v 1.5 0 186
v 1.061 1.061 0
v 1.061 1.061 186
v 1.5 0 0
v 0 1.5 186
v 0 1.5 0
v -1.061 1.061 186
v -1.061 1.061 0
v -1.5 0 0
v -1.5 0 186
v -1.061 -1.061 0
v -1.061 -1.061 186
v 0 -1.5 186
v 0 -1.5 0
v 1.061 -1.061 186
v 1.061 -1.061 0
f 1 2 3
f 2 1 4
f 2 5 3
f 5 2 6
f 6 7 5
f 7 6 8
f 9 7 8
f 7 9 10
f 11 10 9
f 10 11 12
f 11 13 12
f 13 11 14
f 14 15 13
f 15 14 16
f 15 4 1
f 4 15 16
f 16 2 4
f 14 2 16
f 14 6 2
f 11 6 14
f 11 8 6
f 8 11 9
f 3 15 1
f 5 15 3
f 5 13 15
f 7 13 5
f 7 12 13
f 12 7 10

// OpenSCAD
// file: ../configuration.scad
$fa = 2;
$fs = 0.5;

motor_end_height=44;
idler_end_height=28;
carriage_height=13.8;
platform_thickness=10;
platform_fix_dia=28;
platform_dia=38;

bearing_diameter=16;
bearing_dia_clearence=0.5;
bearing_free_dia_clearence=0.8;

hotend_diameter=16.4;
hotend_groove_dia=12;

// Frames

// Places mounting holes for the controller
// 33 = RAMPS 1.3 (Power outputs: Extruder, Bed, Fan)
// 34 = RAMPS 1.3 (Power outputs: Extruder0, Extruder1, Bed)
// 35 = RAMPS 1.3 (Power outputs: Extruder, Fan, Fan)
// 70 = Megatronics
// 701 = Megatronics 2.0

motherboard=35;

frame_thickness=8;

// Distance from motor axle to idler axle
// Calculated regarding length of the HTD3M closed belt 
belt_tooth=354;
spacing = round(((belt_tooth*3) - 3.14159 * 24.83) / 2);

rod_length=spacing+55;
rod_diameter=8;
//platform_hinge_offset=25;
//carriage_hinge_offset=17;

printbed_diameter=170;	//printable aera
printbed_thickness=4;		// used for rendering and approximating build volume


//corner_radius=12;
//frame_radius=(tower_radius-rod_diameter/2-corner_radius)/cos(30);

ball_link_distance=40;//55;
ball_offset=6.5;
ball_distance=ball_link_distance-2*ball_offset;
ball_angle=25;

// Delta Settings

delta_smooth_rod_offset=139.5;//140 - 152 floor(printbed_diameter/(2*sin(ball_angle))-printbed_diameter/2+delta_effector_offset+delta_carriage_offset)
delta_effector_offset=18;
delta_carriage_offset=18;
delta_diagonal_rod=ceil(max(printbed_diameter/2+delta_smooth_rod_offset-delta_effector_offset-delta_carriage_offset,printbed_diameter/(2*sin(ball_angle))));
//|-> 202
delta_radius=(delta_smooth_rod_offset-delta_effector_offset-delta_carriage_offset);

diagonal_rod_length=delta_diagonal_rod-2*8;//165
diagonal_rod_diameter=3;
diagonal_rod_length_lost=(printbed_diameter/(2*sin(ball_angle)))-(printbed_diameter/2+delta_smooth_rod_offset-delta_effector_offset-delta_carriage_offset);

diagonal_rod_angle=acos(delta_radius/delta_diagonal_rod);

echo_result=true;

carriage_altitude=sqrt(pow(delta_diagonal_rod,2)-pow(delta_radius,2));



if(echo_result) {
	echo("printbed_diameter",printbed_diameter);
	echo("delta_diagonal_rod",delta_diagonal_rod);
	echo("diagonal_rod_length",diagonal_rod_length);
	echo("delta_effector_offset",delta_effector_offset);
	echo("delta_carriage_offset",delta_carriage_offset);
	echo("delta_radius",delta_radius);
	echo("diagonal_rod_angle",diagonal_rod_angle);
	echo("carriage_altitude",carriage_altitude);
	echo("diagonal_rod_length_lost",diagonal_rod_length_lost);
	echo("delta_smooth_rod_offset_optimum",printbed_diameter/(2*sin(ball_angle))-printbed_diameter/2+delta_effector_offset+delta_carriage_offset);
	echo("rod_length",rod_length);
}
// main file
include <../configuration.scad>

echo("diagonal rod length",diagonal_rod_length);
diagonal_rod();

module diagonal_rod() {
	color("dimgray") translate([0,0,diagonal_rod_length/2]) cylinder(h = diagonal_rod_length, r = diagonal_rod_diameter/2, center = true, $fn = 8);
}
